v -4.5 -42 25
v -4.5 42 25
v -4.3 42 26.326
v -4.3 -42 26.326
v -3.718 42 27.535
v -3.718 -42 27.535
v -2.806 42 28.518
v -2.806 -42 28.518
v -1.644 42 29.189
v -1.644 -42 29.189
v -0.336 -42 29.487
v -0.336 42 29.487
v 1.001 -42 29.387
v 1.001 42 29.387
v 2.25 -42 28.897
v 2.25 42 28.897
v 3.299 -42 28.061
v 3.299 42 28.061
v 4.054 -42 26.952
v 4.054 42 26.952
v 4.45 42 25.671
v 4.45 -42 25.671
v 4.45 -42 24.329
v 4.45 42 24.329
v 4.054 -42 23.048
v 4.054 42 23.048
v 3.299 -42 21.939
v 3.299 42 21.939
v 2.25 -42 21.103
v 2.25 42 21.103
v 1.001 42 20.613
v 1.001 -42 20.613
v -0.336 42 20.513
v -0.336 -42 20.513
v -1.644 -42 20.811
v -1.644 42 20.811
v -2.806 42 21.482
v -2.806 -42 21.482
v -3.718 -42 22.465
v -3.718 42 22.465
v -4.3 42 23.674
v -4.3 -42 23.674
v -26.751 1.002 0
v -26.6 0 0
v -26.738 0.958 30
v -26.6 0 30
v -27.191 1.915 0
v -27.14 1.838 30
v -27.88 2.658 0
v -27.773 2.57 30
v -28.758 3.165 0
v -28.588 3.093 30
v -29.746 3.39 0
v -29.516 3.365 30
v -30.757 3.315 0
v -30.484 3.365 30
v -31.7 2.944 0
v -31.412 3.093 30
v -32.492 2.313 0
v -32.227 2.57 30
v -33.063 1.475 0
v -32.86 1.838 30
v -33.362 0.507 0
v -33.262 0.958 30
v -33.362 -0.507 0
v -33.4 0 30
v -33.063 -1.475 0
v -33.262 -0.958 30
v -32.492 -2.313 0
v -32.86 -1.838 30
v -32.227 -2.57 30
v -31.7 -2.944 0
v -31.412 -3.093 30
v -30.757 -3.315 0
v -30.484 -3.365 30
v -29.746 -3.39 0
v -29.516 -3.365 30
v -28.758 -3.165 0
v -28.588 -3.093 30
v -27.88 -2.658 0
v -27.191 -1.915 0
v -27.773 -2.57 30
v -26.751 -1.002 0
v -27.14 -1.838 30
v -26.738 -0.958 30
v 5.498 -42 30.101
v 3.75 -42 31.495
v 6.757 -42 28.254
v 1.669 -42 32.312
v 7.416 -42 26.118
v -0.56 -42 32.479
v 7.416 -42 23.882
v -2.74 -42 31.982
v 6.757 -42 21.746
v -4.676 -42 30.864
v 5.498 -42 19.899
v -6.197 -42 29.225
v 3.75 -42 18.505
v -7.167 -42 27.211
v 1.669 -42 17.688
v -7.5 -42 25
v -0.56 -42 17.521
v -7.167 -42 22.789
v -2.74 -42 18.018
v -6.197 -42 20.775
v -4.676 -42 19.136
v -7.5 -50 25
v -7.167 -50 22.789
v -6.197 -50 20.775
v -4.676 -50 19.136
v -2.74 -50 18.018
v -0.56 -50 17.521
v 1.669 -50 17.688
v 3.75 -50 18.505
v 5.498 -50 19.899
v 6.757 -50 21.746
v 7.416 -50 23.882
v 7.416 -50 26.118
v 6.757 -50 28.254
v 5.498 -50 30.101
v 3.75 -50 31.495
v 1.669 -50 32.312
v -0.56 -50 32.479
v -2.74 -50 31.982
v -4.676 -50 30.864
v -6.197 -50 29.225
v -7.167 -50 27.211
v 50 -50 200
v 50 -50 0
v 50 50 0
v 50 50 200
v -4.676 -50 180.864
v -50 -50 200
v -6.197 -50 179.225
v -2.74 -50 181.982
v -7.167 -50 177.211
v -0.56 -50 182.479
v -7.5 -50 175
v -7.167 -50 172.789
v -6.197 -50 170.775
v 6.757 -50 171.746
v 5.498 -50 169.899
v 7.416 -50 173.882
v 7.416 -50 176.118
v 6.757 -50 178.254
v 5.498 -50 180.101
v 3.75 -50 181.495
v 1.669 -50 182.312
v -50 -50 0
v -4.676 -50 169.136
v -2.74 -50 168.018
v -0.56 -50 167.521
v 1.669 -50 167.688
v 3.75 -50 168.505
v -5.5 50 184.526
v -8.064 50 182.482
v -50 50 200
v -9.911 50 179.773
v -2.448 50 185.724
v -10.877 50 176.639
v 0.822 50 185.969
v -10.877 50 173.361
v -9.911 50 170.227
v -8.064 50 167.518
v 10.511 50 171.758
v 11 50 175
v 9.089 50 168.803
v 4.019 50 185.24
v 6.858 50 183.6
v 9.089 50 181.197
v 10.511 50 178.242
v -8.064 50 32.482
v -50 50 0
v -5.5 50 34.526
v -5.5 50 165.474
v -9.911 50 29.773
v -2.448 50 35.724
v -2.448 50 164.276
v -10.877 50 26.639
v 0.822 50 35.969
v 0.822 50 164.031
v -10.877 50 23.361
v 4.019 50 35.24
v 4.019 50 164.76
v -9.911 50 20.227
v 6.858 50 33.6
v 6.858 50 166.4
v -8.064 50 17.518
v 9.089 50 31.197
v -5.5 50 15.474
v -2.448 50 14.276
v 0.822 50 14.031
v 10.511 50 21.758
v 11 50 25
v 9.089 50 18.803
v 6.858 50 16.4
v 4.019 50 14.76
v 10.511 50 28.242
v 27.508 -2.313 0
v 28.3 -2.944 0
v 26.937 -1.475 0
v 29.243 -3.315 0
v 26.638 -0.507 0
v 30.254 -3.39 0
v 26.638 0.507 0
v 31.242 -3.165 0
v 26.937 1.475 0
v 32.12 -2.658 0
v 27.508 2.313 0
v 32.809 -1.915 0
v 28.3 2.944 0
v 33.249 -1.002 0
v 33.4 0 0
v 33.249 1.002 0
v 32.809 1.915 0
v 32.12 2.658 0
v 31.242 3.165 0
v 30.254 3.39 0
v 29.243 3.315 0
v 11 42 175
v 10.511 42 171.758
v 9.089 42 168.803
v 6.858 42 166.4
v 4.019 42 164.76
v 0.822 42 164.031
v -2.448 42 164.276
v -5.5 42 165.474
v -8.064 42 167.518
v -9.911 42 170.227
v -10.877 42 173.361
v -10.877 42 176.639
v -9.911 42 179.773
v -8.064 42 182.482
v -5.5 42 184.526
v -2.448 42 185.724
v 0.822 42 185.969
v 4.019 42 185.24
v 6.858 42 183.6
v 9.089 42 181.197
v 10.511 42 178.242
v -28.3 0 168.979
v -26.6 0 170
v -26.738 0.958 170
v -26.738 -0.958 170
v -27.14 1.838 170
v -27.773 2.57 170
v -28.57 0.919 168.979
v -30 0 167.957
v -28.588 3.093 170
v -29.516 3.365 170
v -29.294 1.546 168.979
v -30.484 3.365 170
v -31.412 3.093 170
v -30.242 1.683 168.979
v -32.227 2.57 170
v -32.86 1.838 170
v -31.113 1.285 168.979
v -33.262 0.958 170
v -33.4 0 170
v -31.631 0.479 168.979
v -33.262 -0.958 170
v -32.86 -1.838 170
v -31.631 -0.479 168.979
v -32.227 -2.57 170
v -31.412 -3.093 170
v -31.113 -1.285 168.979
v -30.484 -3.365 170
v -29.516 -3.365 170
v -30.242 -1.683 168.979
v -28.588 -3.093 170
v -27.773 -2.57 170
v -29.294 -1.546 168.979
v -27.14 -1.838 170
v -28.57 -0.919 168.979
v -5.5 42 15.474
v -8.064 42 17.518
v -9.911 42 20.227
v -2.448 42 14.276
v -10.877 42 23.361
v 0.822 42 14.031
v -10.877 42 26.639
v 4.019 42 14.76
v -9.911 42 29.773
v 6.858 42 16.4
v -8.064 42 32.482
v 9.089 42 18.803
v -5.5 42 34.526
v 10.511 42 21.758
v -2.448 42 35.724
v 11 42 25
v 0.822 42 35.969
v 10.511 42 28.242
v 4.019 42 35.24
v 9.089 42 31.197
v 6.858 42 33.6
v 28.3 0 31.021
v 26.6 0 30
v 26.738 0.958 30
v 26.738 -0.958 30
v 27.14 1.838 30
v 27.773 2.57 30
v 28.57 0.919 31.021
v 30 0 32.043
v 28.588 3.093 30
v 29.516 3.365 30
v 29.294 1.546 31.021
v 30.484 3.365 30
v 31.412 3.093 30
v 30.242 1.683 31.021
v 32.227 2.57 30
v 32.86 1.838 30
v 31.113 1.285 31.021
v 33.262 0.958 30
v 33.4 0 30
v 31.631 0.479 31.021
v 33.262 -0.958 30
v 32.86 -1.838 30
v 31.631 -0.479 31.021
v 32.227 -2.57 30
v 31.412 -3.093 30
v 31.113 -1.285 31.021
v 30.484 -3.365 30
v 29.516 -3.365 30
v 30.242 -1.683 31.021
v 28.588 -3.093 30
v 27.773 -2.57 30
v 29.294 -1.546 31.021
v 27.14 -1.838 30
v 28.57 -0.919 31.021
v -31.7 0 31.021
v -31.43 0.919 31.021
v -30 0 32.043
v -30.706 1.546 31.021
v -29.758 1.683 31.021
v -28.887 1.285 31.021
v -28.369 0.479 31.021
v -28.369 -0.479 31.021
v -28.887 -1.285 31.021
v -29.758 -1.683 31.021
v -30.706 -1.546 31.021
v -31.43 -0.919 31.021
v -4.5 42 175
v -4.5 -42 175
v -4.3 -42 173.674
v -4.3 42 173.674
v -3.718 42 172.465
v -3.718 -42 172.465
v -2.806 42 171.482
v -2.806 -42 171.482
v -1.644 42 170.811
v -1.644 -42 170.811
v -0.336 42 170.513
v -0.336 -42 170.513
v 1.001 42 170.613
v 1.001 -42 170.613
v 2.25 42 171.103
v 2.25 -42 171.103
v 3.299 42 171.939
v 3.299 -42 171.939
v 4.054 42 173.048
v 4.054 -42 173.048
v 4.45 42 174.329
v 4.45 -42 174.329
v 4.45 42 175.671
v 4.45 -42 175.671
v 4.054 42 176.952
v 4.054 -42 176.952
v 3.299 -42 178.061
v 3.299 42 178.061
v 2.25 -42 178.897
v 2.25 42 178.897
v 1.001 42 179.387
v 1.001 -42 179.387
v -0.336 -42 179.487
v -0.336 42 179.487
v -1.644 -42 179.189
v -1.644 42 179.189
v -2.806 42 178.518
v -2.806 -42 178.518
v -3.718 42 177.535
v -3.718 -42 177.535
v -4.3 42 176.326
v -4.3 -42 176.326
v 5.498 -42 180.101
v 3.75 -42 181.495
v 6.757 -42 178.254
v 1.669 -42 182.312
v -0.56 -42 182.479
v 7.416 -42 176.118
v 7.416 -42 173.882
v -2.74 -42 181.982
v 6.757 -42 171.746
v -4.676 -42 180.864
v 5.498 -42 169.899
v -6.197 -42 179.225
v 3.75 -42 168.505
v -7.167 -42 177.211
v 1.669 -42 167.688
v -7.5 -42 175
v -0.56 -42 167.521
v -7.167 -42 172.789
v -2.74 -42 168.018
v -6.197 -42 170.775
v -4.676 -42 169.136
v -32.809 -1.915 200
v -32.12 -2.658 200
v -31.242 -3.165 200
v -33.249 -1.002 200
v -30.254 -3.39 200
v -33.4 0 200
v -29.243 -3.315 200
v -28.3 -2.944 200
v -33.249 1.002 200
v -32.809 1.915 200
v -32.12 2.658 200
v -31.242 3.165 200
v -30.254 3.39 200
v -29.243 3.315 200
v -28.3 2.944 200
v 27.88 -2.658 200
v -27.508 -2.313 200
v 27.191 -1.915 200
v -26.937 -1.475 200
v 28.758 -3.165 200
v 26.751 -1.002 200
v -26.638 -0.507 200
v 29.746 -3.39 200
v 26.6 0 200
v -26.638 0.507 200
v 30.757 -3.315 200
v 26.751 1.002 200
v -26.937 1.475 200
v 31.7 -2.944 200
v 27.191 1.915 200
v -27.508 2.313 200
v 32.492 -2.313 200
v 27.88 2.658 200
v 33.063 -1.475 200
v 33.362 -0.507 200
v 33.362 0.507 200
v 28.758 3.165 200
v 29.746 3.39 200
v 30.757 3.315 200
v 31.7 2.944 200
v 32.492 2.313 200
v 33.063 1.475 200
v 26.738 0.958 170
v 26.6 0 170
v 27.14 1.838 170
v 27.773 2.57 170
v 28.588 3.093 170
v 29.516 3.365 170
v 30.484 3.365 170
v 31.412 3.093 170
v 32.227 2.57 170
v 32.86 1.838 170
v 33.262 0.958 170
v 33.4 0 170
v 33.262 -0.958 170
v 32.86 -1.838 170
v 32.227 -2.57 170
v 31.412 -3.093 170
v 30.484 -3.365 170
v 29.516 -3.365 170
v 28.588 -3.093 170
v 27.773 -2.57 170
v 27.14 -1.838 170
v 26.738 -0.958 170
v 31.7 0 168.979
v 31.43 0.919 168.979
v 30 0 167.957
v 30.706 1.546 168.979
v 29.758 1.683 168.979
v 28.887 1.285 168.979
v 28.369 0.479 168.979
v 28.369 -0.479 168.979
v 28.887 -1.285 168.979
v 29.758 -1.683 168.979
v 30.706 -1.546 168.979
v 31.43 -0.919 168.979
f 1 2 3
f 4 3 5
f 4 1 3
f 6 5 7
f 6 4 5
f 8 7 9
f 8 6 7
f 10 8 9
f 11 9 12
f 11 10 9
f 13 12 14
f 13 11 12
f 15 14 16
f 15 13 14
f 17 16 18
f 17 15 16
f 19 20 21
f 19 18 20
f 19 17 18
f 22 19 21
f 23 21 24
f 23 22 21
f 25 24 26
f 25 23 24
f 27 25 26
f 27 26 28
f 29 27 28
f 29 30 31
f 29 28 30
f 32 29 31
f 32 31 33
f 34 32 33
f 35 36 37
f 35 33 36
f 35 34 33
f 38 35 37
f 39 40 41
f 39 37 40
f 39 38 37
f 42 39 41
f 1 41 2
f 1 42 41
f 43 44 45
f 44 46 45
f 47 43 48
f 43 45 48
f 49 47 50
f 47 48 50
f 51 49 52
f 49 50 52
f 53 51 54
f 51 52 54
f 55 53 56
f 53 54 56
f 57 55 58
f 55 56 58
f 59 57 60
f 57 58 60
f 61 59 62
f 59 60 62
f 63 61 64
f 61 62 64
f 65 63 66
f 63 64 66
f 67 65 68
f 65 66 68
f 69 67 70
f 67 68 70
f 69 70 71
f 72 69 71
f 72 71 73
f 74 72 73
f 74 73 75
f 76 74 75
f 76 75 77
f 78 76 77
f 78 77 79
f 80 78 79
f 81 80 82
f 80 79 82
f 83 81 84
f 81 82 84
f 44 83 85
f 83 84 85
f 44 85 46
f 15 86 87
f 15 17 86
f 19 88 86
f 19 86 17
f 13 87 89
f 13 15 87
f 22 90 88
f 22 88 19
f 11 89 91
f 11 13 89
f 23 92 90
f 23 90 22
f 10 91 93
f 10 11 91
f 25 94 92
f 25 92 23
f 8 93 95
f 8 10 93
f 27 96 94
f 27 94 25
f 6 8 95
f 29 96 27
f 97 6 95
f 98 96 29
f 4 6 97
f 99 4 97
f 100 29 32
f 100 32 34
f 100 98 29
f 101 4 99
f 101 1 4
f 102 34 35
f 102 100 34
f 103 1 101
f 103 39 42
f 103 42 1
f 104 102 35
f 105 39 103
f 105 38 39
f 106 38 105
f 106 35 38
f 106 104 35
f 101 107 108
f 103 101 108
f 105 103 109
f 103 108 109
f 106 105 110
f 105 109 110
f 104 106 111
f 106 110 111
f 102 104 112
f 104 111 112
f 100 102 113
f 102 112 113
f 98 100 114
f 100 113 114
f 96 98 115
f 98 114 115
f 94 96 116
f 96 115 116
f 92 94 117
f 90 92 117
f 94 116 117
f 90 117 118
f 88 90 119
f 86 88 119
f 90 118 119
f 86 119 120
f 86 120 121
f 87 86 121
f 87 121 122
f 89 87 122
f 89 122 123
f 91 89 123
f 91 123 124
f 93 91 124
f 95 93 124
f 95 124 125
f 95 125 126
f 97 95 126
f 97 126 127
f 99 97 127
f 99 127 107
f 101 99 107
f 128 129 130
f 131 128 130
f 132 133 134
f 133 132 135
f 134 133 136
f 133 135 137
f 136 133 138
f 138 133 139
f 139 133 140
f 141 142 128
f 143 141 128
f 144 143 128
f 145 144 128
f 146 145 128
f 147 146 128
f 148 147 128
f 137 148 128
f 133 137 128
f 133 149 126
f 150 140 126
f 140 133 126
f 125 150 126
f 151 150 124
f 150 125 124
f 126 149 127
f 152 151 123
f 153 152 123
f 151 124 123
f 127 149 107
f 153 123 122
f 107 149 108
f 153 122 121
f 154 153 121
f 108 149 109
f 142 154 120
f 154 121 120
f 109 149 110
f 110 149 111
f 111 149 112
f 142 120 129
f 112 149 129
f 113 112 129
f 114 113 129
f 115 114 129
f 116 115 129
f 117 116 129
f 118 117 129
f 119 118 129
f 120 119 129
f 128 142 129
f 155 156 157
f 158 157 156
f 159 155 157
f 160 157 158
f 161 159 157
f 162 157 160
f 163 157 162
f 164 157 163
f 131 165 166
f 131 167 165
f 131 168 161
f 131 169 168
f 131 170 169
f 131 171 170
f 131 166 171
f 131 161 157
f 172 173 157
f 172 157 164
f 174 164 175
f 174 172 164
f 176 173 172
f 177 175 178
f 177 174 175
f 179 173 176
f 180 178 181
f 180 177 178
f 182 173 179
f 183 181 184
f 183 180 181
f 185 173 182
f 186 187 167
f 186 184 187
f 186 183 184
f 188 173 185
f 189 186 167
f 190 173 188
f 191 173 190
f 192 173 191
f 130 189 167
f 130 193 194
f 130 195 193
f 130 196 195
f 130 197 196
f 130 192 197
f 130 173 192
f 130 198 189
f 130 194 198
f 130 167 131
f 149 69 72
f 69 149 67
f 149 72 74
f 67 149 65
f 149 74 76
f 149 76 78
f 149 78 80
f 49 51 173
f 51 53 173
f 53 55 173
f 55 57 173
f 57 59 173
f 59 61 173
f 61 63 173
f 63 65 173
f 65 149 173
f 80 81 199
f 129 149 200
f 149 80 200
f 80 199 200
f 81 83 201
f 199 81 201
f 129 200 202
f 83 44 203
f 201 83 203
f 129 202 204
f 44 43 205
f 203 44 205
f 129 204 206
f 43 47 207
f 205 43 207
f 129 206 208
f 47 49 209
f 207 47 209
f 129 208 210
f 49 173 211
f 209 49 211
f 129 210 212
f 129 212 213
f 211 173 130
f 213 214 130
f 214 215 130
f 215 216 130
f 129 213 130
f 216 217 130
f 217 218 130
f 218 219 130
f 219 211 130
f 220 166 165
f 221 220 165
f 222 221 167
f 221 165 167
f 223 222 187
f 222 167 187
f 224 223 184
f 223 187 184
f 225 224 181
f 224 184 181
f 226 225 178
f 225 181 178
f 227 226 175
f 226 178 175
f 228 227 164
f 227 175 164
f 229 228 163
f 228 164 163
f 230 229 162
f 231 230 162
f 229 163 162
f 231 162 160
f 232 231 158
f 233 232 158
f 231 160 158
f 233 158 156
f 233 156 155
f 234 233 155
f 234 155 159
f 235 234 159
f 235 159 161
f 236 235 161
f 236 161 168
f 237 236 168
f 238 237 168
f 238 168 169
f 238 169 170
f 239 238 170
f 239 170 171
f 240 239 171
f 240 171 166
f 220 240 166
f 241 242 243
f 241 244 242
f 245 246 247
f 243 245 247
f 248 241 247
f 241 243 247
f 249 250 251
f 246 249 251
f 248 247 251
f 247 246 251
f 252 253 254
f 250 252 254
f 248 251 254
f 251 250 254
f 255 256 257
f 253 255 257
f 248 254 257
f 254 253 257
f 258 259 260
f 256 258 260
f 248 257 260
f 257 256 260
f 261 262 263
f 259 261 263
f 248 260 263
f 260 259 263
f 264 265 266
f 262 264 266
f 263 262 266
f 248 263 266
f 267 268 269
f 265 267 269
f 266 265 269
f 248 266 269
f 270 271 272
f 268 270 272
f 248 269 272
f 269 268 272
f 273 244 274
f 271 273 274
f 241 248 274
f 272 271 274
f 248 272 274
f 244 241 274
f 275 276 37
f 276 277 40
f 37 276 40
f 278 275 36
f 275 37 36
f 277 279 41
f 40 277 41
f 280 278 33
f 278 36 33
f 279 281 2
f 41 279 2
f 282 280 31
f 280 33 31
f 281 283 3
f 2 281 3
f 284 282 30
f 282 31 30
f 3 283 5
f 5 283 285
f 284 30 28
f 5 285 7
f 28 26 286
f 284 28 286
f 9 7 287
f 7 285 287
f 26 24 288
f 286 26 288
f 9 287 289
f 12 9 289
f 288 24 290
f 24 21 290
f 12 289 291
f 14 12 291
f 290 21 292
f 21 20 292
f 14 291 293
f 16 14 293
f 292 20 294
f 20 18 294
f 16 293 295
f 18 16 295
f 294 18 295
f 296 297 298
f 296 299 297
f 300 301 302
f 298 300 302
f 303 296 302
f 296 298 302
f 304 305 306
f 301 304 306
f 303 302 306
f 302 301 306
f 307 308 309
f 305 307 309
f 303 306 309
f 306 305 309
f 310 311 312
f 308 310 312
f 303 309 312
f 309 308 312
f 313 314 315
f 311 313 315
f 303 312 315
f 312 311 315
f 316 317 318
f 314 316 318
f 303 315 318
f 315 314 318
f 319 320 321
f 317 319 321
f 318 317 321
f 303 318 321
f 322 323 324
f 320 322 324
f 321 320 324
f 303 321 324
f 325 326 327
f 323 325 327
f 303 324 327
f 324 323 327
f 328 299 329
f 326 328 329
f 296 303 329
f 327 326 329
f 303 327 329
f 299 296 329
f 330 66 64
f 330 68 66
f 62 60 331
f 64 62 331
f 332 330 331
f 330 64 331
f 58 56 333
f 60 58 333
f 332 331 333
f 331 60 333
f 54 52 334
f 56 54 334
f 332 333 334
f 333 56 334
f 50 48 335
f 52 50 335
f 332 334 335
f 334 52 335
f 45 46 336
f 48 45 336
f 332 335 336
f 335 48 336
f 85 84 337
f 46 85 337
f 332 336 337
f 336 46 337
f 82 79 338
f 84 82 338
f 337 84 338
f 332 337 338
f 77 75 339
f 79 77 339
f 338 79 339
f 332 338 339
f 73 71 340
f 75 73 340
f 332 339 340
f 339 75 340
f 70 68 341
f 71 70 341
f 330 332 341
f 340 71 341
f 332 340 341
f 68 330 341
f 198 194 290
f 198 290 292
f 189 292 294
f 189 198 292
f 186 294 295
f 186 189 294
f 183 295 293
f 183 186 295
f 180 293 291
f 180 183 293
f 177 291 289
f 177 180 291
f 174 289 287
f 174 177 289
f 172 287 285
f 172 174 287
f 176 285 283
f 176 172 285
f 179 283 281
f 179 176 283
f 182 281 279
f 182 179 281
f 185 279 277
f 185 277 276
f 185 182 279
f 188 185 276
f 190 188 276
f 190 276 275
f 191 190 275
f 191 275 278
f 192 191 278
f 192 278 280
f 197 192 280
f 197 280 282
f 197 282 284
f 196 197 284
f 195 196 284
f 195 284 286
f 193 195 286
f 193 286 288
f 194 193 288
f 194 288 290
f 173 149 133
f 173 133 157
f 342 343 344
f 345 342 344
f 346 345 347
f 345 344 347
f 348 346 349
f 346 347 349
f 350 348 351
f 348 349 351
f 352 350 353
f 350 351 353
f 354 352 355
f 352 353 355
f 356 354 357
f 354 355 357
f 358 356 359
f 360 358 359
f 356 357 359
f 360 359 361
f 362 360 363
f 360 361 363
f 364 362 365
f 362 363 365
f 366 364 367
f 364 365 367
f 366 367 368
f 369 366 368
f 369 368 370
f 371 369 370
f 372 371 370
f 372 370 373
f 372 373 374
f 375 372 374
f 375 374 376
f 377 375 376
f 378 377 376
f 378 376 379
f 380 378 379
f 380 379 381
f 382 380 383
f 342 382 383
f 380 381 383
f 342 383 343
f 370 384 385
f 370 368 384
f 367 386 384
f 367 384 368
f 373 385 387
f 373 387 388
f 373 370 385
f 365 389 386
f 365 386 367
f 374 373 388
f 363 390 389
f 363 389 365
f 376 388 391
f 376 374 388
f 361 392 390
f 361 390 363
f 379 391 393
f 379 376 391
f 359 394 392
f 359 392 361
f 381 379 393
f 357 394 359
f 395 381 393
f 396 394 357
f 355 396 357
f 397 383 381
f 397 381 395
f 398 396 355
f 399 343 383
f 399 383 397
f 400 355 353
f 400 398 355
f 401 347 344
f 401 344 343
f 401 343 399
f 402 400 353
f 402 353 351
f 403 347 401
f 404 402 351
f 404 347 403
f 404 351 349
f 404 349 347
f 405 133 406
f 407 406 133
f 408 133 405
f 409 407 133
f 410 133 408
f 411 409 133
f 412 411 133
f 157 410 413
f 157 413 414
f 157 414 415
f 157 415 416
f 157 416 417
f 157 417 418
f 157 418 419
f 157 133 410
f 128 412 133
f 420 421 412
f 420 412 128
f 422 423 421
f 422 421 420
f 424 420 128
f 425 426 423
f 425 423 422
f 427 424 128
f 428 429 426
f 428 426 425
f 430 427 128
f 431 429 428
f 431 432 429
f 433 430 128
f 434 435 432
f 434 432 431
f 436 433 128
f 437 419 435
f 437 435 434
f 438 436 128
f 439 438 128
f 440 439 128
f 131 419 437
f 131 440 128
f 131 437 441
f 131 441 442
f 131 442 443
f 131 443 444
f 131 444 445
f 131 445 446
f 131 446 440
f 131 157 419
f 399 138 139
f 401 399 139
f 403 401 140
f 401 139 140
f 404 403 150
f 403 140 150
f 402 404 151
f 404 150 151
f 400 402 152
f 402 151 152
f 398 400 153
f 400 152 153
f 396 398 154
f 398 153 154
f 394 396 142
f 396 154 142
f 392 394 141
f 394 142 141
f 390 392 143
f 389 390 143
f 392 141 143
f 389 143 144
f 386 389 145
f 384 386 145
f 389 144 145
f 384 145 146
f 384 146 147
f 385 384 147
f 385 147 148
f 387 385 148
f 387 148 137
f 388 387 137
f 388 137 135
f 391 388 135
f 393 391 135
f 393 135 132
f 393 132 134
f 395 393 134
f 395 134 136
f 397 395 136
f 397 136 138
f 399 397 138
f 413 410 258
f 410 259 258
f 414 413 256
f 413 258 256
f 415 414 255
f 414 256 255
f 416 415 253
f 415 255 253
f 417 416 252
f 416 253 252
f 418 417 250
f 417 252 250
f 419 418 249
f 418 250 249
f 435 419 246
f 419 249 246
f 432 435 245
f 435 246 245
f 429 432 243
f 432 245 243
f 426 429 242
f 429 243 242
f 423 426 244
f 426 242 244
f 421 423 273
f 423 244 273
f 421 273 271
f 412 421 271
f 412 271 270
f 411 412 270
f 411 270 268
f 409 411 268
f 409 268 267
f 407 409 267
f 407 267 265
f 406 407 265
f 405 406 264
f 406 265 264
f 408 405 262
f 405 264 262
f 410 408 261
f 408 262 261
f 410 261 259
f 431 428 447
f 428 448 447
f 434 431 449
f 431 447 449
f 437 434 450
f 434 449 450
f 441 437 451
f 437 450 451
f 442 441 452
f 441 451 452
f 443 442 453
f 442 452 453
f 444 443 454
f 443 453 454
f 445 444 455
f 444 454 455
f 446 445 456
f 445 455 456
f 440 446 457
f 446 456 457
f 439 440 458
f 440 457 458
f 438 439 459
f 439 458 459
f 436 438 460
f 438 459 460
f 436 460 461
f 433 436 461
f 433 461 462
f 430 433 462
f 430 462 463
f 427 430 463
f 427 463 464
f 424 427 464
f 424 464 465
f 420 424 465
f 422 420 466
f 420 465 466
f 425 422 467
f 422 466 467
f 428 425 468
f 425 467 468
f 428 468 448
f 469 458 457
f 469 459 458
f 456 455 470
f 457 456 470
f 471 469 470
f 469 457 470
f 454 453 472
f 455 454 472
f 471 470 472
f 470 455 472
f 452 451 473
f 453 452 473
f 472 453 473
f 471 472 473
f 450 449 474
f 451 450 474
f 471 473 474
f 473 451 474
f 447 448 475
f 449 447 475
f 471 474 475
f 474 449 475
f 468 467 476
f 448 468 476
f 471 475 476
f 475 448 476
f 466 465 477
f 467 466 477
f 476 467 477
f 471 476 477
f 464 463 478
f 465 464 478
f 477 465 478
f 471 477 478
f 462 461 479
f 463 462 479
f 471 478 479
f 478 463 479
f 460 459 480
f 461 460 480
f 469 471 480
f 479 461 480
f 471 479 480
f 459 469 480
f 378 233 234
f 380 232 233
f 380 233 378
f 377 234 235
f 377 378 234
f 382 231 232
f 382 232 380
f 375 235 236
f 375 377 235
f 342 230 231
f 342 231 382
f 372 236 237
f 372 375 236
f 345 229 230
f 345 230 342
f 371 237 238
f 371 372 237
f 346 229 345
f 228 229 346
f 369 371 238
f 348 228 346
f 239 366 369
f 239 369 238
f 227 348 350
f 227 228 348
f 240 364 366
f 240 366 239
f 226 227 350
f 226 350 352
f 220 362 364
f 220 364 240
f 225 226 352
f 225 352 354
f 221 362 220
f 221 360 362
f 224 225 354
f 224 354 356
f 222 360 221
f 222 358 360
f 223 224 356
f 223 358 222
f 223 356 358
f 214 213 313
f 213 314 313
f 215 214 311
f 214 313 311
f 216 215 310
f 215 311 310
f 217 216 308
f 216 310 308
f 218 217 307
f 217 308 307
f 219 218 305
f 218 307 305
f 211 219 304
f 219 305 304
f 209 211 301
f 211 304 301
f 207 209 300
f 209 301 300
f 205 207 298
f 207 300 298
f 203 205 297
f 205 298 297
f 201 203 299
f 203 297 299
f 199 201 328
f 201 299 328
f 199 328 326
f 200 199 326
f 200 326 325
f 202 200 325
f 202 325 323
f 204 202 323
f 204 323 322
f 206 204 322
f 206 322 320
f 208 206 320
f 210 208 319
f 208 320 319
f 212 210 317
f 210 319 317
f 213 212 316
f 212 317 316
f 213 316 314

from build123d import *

# Parameters (mm, degrees)
SKIZZE1_W                                           = 100
SKIZZE1_H                                           = 100
AUFSATZ_LINEAR_AUSTRAGEN1_DEPTH                     = 200
STIRNSENKUNG_F_R_M8_SENKSCHRAUBE_KOPF_B_D           = 9
STIRNSENKUNG_F_R_M8_SENKSCHRAUBE_KOPF_B_CBORE_D     = 22
STIRNSENKUNG_F_R_M8_SENKSCHRAUBE_KOPF_B_CBORE_DEPTH = 8
KERNLOCH_F_R_M8X1_252_D                             = 6.8
KERNLOCH_F_R_M8X1_252_DEPTH                         = 30
KERNLOCH_F_R_M8X1_252_TIP                           = 2.042926105
KERNLOCH_F_R_M81_D                                  = 6.8
KERNLOCH_F_R_M81_DEPTH                              = 30
KERNLOCH_F_R_M81_TIP                                = 2.042926105
STIRNSENKUNG_F_R_M8_SENKSCHRAUBE_KO_2_D             = 9
STIRNSENKUNG_F_R_M8_SENKSCHRAUBE_KO_2_CBORE_D       = 15
STIRNSENKUNG_F_R_M8_SENKSCHRAUBE_KO_2_CBORE_DEPTH   = 8


with BuildPart() as part:
    # Skizze1 → Aufsatz-Linear austragen1 (new body)
    with BuildSketch(Plane.XY):
        Rectangle(SKIZZE1_W, SKIZZE1_H)
    extrude(amount=AUFSATZ_LINEAR_AUSTRAGEN1_DEPTH)

    # Stirnsenkung f_r M8 Senkschraube _Kopf B (through all)
    with Locations(Plane(origin=(0, 50, 0), x_dir=(1, 0, 0), z_dir=(0, 1, 0))):
        with Locations((0, -175)):
            stirnsenkung_f_r_m8_senkschraube_kopf_b = CounterBoreHole(STIRNSENKUNG_F_R_M8_SENKSCHRAUBE_KOPF_B_D / 2, STIRNSENKUNG_F_R_M8_SENKSCHRAUBE_KOPF_B_CBORE_D / 2, STIRNSENKUNG_F_R_M8_SENKSCHRAUBE_KOPF_B_CBORE_DEPTH)

    # Spiegeln1: Stirnsenkung f_r M8 Senkschraube _Kopf B across plane
    add(stirnsenkung_f_r_m8_senkschraube_kopf_b.mirror(Plane.XY.offset(100)), mode=Mode.SUBTRACT)

    # Kernloch für M8x1.252
    with Locations(Plane(origin=(0, 0, 0), x_dir=(-1, 0, 0), z_dir=(0, 0, -1))):
        with Locations((-30, 0), (30, 0)):
            Hole(KERNLOCH_F_R_M8X1_252_D / 2, depth=KERNLOCH_F_R_M8X1_252_DEPTH)
            with Locations((0, 0, -(KERNLOCH_F_R_M8X1_252_DEPTH + KERNLOCH_F_R_M8X1_252_TIP / 2))):  # 118° drill point
                Cone(0, KERNLOCH_F_R_M8X1_252_D / 2, KERNLOCH_F_R_M8X1_252_TIP, mode=Mode.SUBTRACT)

    # Kernloch für M81
    with Locations(Plane.XY.offset(200)):
        with Locations((30, 0), (-30, 0)):
            Hole(KERNLOCH_F_R_M81_D / 2, depth=KERNLOCH_F_R_M81_DEPTH)
            with Locations((0, 0, -(KERNLOCH_F_R_M81_DEPTH + KERNLOCH_F_R_M81_TIP / 2))):  # 118° drill point
                Cone(0, KERNLOCH_F_R_M81_D / 2, KERNLOCH_F_R_M81_TIP, mode=Mode.SUBTRACT)

    # Stirnsenkung f_r M8 Senkschraube _Ko 2 (through all)
    with Locations(Plane(origin=(0, -50, 0), x_dir=(-1, 0, 0), z_dir=(0, -1, 0))):
        with Locations((0, -175), (0, -25)):
            CounterBoreHole(STIRNSENKUNG_F_R_M8_SENKSCHRAUBE_KO_2_D / 2, STIRNSENKUNG_F_R_M8_SENKSCHRAUBE_KO_2_CBORE_D / 2, STIRNSENKUNG_F_R_M8_SENKSCHRAUBE_KO_2_CBORE_DEPTH)


solid = part.part
